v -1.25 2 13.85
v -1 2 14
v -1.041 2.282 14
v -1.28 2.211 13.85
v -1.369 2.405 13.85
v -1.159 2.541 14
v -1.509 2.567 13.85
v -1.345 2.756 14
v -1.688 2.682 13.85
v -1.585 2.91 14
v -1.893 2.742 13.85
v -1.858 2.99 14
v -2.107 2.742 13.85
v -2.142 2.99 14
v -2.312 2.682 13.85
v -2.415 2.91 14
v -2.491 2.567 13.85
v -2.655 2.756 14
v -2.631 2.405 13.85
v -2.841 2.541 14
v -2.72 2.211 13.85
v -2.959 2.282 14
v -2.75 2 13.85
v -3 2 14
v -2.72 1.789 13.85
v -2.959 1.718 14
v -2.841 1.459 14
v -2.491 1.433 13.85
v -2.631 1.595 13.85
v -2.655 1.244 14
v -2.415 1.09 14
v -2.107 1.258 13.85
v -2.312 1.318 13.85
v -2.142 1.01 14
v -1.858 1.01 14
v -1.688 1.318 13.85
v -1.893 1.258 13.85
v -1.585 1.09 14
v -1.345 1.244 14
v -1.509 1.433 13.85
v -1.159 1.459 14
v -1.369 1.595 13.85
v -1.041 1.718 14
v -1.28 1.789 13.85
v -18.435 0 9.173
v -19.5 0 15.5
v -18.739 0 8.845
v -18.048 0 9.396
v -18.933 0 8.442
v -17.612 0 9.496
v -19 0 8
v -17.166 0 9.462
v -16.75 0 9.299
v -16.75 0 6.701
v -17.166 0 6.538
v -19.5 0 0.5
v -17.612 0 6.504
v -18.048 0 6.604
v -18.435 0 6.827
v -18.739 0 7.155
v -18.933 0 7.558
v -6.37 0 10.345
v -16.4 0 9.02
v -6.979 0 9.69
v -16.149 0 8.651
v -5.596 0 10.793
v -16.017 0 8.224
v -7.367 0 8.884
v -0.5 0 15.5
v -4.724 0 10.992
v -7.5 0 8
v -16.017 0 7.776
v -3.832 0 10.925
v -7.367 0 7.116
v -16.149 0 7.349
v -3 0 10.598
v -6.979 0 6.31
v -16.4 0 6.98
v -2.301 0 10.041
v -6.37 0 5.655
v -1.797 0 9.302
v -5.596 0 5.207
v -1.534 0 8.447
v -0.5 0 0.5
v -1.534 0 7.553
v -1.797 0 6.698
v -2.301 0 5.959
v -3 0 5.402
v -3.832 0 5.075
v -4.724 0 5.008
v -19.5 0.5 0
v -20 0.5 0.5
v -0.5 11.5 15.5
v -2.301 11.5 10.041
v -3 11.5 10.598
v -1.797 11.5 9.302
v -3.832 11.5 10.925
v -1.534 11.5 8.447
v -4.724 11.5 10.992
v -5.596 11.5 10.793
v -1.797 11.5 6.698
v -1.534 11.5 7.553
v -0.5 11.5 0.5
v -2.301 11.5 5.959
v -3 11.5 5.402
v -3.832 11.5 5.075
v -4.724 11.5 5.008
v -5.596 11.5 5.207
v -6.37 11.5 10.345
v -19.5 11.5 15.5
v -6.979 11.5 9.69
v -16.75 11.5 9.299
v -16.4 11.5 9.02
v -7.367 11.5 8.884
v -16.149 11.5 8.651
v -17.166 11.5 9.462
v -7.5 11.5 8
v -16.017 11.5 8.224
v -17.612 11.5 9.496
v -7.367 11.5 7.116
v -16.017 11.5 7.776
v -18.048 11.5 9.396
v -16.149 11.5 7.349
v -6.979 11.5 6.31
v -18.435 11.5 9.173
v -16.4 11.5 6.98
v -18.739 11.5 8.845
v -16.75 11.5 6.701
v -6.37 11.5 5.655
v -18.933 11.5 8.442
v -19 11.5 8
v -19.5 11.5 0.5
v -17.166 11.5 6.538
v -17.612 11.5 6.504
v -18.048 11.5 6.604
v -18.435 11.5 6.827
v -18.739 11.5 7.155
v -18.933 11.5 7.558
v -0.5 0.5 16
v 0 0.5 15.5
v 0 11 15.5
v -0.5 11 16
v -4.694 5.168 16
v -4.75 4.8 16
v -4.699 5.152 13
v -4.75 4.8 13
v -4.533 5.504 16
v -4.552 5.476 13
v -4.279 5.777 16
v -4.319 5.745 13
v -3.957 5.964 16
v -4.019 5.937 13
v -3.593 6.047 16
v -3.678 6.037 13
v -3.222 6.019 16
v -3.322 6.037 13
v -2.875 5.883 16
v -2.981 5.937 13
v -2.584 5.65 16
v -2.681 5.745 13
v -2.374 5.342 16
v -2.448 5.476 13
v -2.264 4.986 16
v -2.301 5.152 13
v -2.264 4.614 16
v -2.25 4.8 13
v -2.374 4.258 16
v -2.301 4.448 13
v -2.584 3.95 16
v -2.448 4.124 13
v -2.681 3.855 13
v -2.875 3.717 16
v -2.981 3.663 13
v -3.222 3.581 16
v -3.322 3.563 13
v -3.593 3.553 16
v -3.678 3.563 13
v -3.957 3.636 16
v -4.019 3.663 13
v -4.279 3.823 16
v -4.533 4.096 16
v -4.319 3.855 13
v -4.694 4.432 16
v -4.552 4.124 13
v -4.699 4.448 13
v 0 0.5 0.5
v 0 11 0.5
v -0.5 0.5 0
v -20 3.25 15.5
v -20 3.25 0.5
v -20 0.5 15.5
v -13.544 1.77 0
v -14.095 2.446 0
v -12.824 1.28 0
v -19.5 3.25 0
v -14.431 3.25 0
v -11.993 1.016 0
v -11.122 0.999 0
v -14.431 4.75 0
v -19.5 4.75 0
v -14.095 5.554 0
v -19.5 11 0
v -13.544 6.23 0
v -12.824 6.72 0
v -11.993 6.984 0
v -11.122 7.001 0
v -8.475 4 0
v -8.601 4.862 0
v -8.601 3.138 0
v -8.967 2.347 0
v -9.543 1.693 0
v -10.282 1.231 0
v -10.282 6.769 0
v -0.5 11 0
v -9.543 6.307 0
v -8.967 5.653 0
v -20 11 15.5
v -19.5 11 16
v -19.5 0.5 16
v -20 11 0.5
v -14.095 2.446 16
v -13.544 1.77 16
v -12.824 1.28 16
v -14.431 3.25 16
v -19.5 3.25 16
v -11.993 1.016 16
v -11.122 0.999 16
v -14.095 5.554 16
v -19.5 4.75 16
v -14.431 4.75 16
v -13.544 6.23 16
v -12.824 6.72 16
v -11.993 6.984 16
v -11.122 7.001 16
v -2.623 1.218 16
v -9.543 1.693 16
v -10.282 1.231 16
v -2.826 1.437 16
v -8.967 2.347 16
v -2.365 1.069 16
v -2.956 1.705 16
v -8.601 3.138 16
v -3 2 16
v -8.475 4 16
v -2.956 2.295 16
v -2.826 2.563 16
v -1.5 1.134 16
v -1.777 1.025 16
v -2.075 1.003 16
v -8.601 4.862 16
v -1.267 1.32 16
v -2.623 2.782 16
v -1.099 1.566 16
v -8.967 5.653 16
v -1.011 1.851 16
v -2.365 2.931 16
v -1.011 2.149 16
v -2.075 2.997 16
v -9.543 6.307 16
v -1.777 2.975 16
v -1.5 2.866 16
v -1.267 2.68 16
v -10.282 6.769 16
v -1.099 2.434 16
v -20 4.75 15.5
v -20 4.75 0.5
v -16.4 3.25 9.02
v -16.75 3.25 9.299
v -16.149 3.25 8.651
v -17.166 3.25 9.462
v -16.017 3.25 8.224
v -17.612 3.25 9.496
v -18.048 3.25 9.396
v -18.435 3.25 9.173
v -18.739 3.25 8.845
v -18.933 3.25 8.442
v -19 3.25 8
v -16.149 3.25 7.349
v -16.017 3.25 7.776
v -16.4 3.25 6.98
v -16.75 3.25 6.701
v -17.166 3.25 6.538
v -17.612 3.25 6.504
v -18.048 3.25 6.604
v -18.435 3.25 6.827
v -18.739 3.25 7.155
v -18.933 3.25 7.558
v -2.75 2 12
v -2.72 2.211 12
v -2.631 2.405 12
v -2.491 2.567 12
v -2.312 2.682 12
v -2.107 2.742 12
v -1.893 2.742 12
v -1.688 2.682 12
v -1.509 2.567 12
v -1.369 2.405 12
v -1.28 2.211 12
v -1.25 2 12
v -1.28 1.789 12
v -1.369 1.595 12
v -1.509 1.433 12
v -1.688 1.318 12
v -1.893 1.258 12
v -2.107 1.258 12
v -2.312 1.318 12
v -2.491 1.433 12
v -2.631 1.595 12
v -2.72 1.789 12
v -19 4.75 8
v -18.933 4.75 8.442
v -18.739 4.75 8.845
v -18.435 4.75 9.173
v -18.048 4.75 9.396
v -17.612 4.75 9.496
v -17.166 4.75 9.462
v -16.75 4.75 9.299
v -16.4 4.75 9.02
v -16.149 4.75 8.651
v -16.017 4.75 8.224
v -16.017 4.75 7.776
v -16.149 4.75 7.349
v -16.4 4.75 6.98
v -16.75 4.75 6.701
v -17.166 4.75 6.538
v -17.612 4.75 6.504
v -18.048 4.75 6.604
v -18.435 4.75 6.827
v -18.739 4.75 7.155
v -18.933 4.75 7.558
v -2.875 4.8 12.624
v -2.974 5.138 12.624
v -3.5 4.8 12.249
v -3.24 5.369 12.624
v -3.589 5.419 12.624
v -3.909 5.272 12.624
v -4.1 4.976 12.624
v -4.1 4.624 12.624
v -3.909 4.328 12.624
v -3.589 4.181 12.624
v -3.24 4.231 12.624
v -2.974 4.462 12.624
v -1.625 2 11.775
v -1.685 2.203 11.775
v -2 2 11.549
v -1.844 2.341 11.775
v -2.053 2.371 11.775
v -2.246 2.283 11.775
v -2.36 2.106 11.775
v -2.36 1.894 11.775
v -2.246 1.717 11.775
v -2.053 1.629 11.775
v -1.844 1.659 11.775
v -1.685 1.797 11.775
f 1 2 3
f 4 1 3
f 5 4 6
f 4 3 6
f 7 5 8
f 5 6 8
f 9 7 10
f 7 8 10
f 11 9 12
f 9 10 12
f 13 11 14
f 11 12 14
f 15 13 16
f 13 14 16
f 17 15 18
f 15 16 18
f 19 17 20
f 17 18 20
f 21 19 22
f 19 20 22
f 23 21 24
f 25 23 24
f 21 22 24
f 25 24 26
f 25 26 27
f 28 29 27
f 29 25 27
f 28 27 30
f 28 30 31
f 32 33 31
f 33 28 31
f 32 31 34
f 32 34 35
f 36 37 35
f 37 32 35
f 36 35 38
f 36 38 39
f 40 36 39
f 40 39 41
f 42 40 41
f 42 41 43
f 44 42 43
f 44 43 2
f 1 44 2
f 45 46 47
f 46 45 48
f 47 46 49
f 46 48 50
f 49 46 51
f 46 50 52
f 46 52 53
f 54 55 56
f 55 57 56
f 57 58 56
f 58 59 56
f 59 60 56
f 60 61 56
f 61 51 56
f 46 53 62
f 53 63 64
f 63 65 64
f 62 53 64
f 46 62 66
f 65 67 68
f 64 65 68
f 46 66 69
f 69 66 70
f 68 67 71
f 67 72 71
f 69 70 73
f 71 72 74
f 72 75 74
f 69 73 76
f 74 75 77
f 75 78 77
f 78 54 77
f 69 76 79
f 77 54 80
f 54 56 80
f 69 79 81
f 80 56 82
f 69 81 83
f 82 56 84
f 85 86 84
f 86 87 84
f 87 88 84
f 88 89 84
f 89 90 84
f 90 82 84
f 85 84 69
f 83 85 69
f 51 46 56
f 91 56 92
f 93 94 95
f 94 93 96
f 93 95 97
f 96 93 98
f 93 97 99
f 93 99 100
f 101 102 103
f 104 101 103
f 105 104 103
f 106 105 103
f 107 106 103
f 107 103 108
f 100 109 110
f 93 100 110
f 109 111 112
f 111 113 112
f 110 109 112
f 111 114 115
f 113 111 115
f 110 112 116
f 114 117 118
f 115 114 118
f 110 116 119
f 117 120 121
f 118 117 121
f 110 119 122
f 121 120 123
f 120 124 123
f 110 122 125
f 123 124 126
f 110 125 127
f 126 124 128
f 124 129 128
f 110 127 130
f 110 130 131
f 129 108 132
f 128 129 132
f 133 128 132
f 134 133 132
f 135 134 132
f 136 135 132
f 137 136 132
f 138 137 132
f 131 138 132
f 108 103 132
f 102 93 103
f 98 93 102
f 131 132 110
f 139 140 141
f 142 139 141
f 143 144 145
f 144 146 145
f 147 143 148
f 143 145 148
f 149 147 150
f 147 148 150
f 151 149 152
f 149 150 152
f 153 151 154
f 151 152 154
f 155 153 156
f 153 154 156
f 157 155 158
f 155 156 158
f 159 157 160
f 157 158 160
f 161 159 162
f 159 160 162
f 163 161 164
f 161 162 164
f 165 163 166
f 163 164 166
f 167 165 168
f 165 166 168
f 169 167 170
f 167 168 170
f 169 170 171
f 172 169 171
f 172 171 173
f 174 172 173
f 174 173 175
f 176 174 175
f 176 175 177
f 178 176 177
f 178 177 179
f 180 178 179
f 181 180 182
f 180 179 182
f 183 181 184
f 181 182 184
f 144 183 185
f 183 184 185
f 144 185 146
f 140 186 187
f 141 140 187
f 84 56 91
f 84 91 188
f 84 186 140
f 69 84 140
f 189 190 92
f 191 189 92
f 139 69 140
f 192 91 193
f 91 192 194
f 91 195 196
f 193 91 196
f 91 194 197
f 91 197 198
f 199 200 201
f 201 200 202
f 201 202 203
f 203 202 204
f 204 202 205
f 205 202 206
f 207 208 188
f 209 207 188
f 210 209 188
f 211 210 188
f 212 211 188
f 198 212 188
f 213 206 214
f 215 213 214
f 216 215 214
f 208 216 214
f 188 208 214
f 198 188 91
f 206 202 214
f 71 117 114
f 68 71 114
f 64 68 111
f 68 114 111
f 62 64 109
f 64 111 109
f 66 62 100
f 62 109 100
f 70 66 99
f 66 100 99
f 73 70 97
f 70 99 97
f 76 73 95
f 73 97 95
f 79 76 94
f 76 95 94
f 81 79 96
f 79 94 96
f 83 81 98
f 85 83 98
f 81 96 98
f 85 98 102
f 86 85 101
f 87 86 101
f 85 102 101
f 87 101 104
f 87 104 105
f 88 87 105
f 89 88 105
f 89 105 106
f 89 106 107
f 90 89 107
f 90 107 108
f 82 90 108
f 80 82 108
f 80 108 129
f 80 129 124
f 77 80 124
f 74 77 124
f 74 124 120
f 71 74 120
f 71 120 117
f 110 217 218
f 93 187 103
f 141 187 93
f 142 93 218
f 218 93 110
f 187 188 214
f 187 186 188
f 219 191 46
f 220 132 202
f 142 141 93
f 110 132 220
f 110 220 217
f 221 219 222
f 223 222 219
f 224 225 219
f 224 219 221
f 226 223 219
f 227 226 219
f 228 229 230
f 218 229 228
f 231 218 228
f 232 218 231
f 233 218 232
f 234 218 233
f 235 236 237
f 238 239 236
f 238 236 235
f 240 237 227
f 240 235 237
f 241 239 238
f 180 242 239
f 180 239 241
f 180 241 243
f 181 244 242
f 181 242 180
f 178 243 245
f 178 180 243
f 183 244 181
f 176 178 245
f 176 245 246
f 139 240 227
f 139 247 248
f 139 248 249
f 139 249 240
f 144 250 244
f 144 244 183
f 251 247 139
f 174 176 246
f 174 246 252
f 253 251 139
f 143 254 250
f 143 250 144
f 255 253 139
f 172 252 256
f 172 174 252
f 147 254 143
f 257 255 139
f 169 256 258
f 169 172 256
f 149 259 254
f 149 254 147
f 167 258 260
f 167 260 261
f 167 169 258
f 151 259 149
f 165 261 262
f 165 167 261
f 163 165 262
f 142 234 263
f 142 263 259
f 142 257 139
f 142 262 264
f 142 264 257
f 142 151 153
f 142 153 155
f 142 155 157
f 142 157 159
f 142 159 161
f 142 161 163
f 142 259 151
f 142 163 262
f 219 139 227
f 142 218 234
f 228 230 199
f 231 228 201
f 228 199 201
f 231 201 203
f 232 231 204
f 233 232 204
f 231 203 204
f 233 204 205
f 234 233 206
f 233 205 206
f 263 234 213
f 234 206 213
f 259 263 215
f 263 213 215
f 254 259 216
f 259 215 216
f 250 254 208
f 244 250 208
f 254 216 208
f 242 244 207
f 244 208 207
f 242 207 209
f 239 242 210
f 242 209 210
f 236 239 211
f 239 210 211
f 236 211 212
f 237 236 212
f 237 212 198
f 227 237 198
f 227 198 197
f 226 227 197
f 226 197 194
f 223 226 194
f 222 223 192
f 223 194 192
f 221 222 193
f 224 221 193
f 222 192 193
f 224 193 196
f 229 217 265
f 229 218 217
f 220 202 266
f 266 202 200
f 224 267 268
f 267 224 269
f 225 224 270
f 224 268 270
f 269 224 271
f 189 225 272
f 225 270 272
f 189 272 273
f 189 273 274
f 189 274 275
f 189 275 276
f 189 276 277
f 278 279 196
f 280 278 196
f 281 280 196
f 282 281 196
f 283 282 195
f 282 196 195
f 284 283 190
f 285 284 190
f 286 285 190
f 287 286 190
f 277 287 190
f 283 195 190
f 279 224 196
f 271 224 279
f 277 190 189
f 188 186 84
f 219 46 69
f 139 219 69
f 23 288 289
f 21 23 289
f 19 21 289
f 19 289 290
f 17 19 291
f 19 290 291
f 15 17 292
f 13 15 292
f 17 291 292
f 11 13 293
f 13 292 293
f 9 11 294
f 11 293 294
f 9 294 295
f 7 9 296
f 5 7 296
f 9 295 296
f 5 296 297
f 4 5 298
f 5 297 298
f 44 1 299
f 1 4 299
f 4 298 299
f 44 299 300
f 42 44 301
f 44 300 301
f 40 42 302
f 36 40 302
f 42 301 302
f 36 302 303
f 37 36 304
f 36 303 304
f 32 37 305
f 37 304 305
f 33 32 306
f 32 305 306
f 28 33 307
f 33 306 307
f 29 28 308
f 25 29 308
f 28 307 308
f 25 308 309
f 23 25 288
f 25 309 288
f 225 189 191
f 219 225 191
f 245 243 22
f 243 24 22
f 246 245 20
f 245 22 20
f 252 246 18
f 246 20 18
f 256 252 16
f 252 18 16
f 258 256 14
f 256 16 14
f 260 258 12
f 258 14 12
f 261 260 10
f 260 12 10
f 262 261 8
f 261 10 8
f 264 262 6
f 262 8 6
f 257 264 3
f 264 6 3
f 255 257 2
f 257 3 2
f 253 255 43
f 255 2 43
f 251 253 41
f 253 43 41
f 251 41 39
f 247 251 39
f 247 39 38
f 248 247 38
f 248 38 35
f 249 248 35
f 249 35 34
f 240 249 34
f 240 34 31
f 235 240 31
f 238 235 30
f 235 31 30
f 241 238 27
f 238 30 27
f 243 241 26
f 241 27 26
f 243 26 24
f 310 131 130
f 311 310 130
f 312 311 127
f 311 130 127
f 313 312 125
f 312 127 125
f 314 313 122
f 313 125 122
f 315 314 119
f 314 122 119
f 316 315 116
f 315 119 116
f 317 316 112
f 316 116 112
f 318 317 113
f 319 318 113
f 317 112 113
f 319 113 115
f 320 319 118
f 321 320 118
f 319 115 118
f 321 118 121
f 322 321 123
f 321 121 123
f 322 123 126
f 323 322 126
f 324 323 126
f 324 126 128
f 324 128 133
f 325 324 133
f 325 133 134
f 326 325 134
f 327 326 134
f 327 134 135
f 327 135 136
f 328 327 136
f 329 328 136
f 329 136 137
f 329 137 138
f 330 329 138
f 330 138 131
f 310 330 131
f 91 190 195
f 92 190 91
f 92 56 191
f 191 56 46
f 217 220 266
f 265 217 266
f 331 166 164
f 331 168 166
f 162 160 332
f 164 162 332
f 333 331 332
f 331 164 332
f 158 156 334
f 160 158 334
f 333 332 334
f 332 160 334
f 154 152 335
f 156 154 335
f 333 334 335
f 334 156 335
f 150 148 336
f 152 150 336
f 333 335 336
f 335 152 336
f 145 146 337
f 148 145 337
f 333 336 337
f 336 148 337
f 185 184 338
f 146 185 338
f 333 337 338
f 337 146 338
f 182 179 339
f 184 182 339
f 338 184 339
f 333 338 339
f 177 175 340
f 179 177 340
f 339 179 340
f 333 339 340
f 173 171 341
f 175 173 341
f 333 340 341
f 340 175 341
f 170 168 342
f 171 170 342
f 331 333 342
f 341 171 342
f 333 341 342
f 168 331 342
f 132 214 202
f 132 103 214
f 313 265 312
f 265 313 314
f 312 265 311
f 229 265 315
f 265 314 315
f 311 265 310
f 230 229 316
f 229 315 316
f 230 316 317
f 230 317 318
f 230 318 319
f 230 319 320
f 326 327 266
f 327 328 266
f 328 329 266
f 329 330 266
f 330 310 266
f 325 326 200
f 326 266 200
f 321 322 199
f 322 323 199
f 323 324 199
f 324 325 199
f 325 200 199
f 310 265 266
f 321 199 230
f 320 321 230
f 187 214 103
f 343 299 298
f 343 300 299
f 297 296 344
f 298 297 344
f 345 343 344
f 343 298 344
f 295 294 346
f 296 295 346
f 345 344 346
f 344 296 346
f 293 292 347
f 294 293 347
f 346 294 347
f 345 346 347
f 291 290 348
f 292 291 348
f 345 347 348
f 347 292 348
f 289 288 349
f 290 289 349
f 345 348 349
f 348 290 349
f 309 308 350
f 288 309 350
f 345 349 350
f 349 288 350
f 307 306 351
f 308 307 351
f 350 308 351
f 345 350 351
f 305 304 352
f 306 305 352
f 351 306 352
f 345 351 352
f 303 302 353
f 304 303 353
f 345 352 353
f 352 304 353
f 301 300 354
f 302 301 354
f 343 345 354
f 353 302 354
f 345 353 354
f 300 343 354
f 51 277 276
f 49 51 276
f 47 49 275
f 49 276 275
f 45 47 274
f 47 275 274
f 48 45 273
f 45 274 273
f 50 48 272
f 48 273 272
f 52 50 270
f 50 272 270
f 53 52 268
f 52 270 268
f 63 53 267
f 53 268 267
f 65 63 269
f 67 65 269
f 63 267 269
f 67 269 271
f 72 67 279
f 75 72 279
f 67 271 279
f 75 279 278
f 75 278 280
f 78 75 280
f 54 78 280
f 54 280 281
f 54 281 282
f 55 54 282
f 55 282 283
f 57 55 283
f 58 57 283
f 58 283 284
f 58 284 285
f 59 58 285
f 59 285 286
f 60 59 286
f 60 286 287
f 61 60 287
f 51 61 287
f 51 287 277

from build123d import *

# Parameters (mm, degrees)
AUFSATZ_LINEAR_AUSTRAGEN1_DEPTH      = 16
SCHNITT_LINEAR_AUSTRAGEN1_REACH      = 30.076
SKIZZE2_R                            = 1.5
SKIZZE2_R_2                          = 3
M3_GEWINDEBOHRUNG1_D                 = 2.5
M3_GEWINDEBOHRUNG1_DEPTH             = 3
M3_GEWINDEBOHRUNG1_TIP               = 0.751075774
F_1_5_1_5_DURCHMESSER_BOHRUNG1_D     = 1.5
F_1_5_1_5_DURCHMESSER_BOHRUNG1_DEPTH = 4
F_1_5_1_5_DURCHMESSER_BOHRUNG1_TIP   = 0.450645464
F_2_0_2_DURCHMESSER_BOHRUNG1_D       = 2
F_2_0_2_DURCHMESSER_BOHRUNG1_DEPTH   = 2
F_2_0_2_DURCHMESSER_BOHRUNG1_TIP     = 0.600860619
FASE1_SIZE                           = 0.5


with BuildPart() as part:
    # Skizze1 → Aufsatz-Linear austragen1 (new body)
    with BuildSketch(Plane.XY):
        with BuildLine():
            Line((-20, 4.75), (-14.43055029, 4.75))
            ThreePointArc((-14.43055029, 4.75), (-8.475, 4), (-14.43055029, 3.25))
            Line((-14.43055029, 3.25), (-20, 3.25))
            Line((-20, 3.25), (-20, 0))
            Line((-20, 0), (0, 0))
            Line((0, 0), (0, 11.5))
            Line((0, 11.5), (-20, 11.5))
            Line((-20, 11.5), (-20, 4.75))
        make_face()
    extrude(amount=AUFSATZ_LINEAR_AUSTRAGEN1_DEPTH)

    # Schnitt-Linear austragen1: up to this face of the body (flat: up to its plane)
    schnitt_linear_austragen1_end = Plane(part.part.faces().sort_by_distance((-10, 0, 8))[0])
    # Skizze2 → Schnitt-Linear austragen1 (cut, up to the picked face)
    with BuildSketch(Plane(origin=(0, 11.5, 0), x_dir=(1, 0, 0), z_dir=(0, 1, 0)), mode=Mode.PRIVATE) as schnitt_linear_austragen1_sk1:
        with Locations(Location((-17.5, -8, 0), (0, 0, 180))):
            Circle(SKIZZE2_R)
    schnitt_linear_austragen1_tool1 = split(extrude(schnitt_linear_austragen1_sk1.sketch, amount=-SCHNITT_LINEAR_AUSTRAGEN1_REACH, mode=Mode.PRIVATE), bisect_by=schnitt_linear_austragen1_end, keep=Keep.BOTH, mode=Mode.PRIVATE)
    # Skizze2 → Schnitt-Linear austragen1 (cut, up to the picked face)
    with BuildSketch(Plane(origin=(0, 11.5, 0), x_dir=(1, 0, 0), z_dir=(0, 1, 0)), mode=Mode.PRIVATE) as schnitt_linear_austragen1_sk2:
        with Locations(Location((-4.5, -8, 0), (0, 0, 180))):
            Circle(SKIZZE2_R_2)
    schnitt_linear_austragen1_tool2 = split(extrude(schnitt_linear_austragen1_sk2.sketch, amount=-SCHNITT_LINEAR_AUSTRAGEN1_REACH, mode=Mode.PRIVATE), bisect_by=schnitt_linear_austragen1_end, keep=Keep.BOTH, mode=Mode.PRIVATE)
    add(schnitt_linear_austragen1_tool1.solids().sort_by(Axis((-17.5, 11.5, 8), (0, -1, 0)))[0], mode=Mode.SUBTRACT)
    add(schnitt_linear_austragen1_tool2.solids().sort_by(Axis((-4.5, 11.5, 8), (0, -1, 0)))[0], mode=Mode.SUBTRACT)

    # M3 Gewindebohrung1
    with Locations(Plane.XY.offset(16)):
        with Locations((-3.5, 4.8)):
            Hole(M3_GEWINDEBOHRUNG1_D / 2, depth=M3_GEWINDEBOHRUNG1_DEPTH)
            with Locations((0, 0, -(M3_GEWINDEBOHRUNG1_DEPTH + M3_GEWINDEBOHRUNG1_TIP / 2))):  # 118° drill point
                Cone(0, M3_GEWINDEBOHRUNG1_D / 2, M3_GEWINDEBOHRUNG1_TIP, mode=Mode.SUBTRACT)

    # Ø1.5 (1.5) Durchmesser Bohrung1
    with Locations(Plane.XY.offset(16)):
        with Locations((-2, 2)):
            Hole(F_1_5_1_5_DURCHMESSER_BOHRUNG1_D / 2, depth=F_1_5_1_5_DURCHMESSER_BOHRUNG1_DEPTH)
            with Locations((0, 0, -(F_1_5_1_5_DURCHMESSER_BOHRUNG1_DEPTH + F_1_5_1_5_DURCHMESSER_BOHRUNG1_TIP / 2))):  # 118° drill point
                Cone(0, F_1_5_1_5_DURCHMESSER_BOHRUNG1_D / 2, F_1_5_1_5_DURCHMESSER_BOHRUNG1_TIP, mode=Mode.SUBTRACT)

    # Ø2.0 (2) Durchmesser Bohrung1
    with Locations(Plane.XY.offset(16)):
        with Locations((-2, 2)):
            Hole(F_2_0_2_DURCHMESSER_BOHRUNG1_D / 2, depth=F_2_0_2_DURCHMESSER_BOHRUNG1_DEPTH)
            with Locations((0, 0, -(F_2_0_2_DURCHMESSER_BOHRUNG1_DEPTH + F_2_0_2_DURCHMESSER_BOHRUNG1_TIP / 2))):  # 118° drill point
                Cone(0, F_2_0_2_DURCHMESSER_BOHRUNG1_D / 2, F_2_0_2_DURCHMESSER_BOHRUNG1_TIP, mode=Mode.SUBTRACT)

    # Fase1
    fase1_edges = [part.edges().sort_by_distance(p)[0] for p in [
        (-20, 8.125, 16),
        (-10, 11.5, 0),
        (0, 5.75, 0),
        (0, 0, 8),
        (-20, 0, 8),
        (-20, 11.5, 8),
        (0, 11.5, 8),
        (-20, 1.625, 16),
        (-10, 0, 16),
        (0, 5.75, 16),
        (-10, 11.5, 16),
        (-10, 0, 0),
        (-20, 1.625, 0),
        (-20, 8.125, 0),
    ]]
    chamfer(fase1_edges, length=FASE1_SIZE)


solid = part.part
